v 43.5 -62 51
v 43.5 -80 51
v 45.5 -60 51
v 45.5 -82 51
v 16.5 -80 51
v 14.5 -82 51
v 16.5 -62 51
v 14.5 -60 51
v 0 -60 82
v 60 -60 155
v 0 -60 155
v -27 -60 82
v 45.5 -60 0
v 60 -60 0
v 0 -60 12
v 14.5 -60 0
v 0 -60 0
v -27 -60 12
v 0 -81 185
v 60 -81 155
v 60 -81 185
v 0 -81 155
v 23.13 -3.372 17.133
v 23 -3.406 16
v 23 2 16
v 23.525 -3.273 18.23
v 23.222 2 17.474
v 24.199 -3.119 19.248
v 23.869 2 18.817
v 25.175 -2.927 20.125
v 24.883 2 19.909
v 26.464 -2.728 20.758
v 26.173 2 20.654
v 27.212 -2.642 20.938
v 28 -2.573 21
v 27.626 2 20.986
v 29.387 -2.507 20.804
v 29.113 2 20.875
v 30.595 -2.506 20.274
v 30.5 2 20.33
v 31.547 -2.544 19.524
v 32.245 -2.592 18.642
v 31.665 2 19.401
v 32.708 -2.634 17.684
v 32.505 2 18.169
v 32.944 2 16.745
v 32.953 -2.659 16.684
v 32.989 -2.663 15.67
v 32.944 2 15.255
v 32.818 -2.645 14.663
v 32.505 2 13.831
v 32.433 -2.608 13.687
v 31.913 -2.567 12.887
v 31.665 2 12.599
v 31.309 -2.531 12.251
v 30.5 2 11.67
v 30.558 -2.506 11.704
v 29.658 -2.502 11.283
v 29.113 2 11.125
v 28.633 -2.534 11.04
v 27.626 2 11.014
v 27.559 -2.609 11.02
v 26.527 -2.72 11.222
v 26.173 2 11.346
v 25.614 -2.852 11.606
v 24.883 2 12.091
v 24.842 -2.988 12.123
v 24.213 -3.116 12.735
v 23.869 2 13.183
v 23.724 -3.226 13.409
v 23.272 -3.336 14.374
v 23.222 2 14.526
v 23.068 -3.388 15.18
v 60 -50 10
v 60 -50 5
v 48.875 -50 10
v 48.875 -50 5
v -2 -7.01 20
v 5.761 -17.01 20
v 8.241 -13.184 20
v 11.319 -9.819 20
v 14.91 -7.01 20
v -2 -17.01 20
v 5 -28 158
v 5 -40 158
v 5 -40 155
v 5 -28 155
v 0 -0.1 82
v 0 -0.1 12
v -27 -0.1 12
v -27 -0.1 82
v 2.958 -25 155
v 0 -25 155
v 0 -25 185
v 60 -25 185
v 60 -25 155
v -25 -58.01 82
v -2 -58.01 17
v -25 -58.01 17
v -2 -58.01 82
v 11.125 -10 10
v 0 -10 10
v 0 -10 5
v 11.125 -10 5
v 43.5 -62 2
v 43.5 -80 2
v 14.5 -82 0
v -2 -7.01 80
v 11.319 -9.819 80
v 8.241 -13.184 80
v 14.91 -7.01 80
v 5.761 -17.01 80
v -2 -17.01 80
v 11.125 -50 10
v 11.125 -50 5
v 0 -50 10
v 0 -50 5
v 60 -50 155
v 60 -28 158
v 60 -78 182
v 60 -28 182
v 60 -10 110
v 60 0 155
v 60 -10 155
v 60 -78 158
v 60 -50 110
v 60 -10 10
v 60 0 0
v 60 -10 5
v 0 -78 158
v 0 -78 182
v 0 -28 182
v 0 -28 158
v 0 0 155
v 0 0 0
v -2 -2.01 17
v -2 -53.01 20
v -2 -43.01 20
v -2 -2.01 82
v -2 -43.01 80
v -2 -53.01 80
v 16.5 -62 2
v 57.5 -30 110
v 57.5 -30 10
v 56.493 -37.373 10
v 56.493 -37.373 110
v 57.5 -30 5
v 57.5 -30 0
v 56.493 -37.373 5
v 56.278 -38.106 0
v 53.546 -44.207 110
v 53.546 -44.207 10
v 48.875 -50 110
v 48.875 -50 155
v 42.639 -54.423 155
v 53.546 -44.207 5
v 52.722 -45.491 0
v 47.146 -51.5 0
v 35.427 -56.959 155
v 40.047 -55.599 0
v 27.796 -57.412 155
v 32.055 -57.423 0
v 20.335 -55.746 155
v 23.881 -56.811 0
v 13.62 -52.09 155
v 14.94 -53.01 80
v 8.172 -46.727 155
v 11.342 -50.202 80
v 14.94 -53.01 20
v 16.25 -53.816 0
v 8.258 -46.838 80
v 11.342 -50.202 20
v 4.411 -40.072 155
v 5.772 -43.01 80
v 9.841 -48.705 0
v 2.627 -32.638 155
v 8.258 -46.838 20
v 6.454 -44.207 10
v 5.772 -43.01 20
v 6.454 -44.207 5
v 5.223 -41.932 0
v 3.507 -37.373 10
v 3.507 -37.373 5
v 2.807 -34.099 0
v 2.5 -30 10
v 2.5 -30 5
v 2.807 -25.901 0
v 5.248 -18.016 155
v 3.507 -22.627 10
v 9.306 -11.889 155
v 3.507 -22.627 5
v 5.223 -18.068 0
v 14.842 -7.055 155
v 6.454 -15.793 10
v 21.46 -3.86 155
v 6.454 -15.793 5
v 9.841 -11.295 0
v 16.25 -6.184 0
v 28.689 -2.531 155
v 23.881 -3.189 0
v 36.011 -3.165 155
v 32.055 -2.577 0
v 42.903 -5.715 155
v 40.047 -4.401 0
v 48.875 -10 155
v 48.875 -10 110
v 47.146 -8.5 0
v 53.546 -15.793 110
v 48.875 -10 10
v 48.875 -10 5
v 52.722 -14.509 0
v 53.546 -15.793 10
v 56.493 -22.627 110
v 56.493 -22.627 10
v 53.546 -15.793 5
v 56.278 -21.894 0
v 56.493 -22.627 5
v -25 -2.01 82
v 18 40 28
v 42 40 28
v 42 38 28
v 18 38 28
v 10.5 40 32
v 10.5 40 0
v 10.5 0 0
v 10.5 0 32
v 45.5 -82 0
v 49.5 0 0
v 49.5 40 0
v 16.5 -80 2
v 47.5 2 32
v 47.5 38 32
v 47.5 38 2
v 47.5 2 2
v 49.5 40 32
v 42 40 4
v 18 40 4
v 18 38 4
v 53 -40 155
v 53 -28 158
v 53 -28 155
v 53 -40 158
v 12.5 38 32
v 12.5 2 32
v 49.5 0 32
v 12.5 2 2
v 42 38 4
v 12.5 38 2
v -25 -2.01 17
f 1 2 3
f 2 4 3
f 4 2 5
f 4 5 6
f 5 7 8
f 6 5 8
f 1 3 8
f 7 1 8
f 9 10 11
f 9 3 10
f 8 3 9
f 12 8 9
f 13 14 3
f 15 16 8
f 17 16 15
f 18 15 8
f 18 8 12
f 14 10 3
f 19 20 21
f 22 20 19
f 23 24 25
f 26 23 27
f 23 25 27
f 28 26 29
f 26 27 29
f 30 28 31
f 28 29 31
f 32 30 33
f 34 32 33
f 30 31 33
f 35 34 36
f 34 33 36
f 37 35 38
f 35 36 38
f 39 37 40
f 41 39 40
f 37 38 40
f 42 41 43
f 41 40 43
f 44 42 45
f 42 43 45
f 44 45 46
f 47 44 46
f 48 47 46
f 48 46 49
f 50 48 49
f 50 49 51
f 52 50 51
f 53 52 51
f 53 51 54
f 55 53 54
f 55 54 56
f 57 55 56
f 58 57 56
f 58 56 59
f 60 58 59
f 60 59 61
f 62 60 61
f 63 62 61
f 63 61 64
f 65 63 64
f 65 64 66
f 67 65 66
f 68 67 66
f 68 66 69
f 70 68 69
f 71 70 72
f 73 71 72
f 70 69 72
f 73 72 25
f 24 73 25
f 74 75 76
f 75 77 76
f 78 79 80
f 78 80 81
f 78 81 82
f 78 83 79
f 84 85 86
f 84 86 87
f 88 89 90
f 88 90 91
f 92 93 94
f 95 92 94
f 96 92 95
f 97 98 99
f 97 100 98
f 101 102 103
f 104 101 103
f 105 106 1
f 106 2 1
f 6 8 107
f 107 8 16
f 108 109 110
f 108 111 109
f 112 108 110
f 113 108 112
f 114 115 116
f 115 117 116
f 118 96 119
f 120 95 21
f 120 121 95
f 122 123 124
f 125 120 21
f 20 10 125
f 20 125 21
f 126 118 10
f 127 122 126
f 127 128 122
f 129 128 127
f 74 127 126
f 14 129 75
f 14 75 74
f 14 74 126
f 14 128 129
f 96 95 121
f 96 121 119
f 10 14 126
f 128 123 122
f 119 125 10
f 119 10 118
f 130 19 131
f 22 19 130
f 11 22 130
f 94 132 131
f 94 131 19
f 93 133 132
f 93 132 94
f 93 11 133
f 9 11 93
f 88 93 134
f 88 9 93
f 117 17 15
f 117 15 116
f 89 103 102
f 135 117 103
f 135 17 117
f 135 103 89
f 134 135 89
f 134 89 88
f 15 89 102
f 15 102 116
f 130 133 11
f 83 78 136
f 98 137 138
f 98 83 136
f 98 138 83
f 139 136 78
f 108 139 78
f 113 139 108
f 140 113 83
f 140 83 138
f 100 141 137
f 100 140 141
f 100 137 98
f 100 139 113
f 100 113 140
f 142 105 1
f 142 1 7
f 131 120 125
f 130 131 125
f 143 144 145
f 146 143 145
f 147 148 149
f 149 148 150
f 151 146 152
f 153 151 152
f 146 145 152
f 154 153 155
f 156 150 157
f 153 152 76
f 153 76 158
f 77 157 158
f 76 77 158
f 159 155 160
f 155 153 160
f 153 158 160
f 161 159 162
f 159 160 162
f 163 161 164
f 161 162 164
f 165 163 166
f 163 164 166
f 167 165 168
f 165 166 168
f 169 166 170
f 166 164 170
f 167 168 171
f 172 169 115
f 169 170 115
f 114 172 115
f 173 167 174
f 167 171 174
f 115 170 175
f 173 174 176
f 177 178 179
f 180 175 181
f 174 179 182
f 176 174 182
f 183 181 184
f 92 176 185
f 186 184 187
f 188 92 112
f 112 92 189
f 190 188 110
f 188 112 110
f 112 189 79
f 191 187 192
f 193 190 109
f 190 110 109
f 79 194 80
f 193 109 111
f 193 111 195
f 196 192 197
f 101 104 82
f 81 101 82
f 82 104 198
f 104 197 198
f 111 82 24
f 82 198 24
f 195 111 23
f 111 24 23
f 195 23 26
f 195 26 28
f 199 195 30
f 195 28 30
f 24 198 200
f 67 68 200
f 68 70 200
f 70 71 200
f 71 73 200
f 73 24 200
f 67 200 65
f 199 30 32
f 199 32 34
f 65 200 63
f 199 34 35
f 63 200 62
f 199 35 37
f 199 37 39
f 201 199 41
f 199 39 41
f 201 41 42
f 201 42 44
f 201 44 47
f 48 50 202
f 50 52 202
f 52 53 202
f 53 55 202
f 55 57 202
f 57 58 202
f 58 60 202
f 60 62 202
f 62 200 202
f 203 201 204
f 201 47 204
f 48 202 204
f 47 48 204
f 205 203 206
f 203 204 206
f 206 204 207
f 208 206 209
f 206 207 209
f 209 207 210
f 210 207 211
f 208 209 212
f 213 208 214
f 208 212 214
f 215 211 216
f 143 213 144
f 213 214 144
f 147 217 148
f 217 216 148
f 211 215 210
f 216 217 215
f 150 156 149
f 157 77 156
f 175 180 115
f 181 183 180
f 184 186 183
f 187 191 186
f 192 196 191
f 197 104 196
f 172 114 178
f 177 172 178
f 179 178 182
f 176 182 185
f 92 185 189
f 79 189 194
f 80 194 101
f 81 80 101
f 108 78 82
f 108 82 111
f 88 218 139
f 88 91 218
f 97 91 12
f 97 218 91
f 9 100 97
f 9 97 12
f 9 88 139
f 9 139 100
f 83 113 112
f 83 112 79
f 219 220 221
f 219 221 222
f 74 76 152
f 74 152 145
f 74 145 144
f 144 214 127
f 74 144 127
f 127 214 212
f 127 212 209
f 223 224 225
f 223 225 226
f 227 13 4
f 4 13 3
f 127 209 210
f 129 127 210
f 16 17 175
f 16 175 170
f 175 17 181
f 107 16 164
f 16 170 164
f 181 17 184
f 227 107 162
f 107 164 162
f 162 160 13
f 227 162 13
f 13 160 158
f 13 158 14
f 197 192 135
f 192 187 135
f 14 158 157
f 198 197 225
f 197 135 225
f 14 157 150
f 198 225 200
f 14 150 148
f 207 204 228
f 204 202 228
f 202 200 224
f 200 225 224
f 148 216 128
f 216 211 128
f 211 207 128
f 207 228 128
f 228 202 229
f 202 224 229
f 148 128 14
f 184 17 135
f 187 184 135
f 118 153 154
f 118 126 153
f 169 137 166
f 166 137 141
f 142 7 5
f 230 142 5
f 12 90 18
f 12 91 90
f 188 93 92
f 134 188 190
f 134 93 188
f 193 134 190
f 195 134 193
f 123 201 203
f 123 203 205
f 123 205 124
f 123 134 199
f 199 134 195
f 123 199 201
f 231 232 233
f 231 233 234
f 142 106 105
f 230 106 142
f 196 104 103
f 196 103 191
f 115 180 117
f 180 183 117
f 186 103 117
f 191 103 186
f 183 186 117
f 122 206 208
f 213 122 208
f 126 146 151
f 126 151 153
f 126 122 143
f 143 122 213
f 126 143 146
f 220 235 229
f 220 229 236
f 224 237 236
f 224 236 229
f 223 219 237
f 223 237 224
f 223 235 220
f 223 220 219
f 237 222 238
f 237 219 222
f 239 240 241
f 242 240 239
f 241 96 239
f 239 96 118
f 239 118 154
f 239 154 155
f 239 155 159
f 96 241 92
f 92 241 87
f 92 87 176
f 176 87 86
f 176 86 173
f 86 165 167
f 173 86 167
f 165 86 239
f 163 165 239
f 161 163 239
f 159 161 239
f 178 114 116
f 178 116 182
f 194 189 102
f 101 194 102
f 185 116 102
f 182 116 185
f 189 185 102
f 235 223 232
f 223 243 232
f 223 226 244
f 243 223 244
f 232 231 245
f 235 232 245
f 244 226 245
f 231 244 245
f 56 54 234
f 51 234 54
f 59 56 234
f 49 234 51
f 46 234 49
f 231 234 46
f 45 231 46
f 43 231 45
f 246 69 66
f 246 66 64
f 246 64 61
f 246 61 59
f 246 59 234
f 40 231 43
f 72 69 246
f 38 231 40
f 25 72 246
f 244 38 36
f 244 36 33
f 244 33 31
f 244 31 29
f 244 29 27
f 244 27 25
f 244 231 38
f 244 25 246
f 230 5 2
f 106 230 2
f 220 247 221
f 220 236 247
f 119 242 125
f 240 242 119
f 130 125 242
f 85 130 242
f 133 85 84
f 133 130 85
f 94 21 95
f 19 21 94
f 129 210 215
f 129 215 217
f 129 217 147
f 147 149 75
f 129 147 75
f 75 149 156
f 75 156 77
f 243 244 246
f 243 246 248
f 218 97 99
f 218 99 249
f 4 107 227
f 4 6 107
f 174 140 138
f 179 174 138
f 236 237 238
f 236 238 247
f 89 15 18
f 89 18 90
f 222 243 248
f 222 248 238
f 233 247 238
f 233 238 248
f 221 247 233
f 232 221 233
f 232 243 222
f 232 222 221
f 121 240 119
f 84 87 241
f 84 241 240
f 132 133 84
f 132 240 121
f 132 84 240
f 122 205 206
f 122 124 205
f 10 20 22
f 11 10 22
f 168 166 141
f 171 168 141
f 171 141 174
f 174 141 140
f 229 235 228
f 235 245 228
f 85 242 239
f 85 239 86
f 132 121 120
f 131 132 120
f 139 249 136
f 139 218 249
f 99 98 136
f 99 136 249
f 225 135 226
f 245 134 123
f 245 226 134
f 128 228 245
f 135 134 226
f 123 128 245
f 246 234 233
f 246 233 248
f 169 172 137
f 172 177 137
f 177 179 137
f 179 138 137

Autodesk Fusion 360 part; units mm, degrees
sketch "Sketch1" plane through (0, 0, 0) normal (0, 0, 1) x (1, 0, 0)
  line L0 (0, 0) -> (60, 0)
  line L1 (60, 0) -> (60, -60)
  line L2 (60, -60) -> (0, -60)
  line L3 (0, -60) -> (0, 0)
  dimension "d1" = 60
  dimension "d2" = 60
extrude "Extrude1" add sketch "Sketch1" along normal blind 155
sketch "Sketch2" plane through (0, 0, 0) normal (0, 0, 1) x (1, 0, 0)
  line L0 (0, 0) -> (30, 0)
  line L1 (30, 0) -> (30, -30)
  circle A0 centre (30, -30) radius 27.5
  dimension "d5" = 30
  dimension "d6" = 30
  dimension "d7" = 55
extrude "Extrude2" cut sketch "Sketch2" along normal through all
sketch "Sketch3" plane through (0, 0, 0) normal (1, 0, 0) x (0, 1, 0)
  line L0 (0, 0) -> (0, 5)
  line L1 (0, 5) -> (-10, 5)
  line L2 (-10, 5) -> (-50, 5)
  line L3 (-50, 5) -> (-50, 10)
  line L4 (-50, 10) -> (-10, 10)
  line L5 (-10, 10) -> (-10, 5)
  dimension "d9" = 10
  dimension "d10" = 5
  dimension "d11" = 40
  dimension "d12" = 5
extrude "Extrude3" cut sketch "Sketch3" along normal through all
sketch "Sketch4" plane through (0, 0, 0) normal (-1, 0, 0) x (0, -1, 0)
  line L0 (50, 10) -> (50, 5)
  line L1 (50, 5) -> (10, 5)
  line L2 (10, 5) -> (10, 10)
  line L3 (10, 10) -> (50, 10)
  line L4 (0, 0) -> (60, 0)
  line L5 (60, 0) -> (60, 155)
  line L6 (60, 155) -> (0, 155)
  line L7 (0, 155) -> (0, 0)
  line L8 (0.1, 82) -> (60, 82)
  line L9 (60, 82) -> (60, 12)
  line L10 (60, 12) -> (0.1, 12)
  line L11 (0.1, 12) -> (0.1, 82)
  line L12 (0.1, 82) -> (0, 155)
  line L13 (0.1, 82) -> (0, 82)
  dimension "d15" = 59.9
  dimension "d16" = 70
  dimension "d98" = 73
  dimension "d99" = 0.1
extrude "Extrude4" add sketch "Sketch4" along normal blind 27 contours L5 L8 L9 L10 L11
sketch "Sketch5" plane through (0, 0, 155) normal (0, 0, 1) x (-1, 0, 0)
  circle A0 centre (-30, 30) radius 27.5
  line L0 (0, 60) -> (-60, 60)
  line L1 (-60, 60) -> (-60, 0)
  line L2 (-60, 0) -> (0, 0)
  line L3 (0, 0) -> (0, 60)
  line L4 (27, 0.01) -> (25, 0.01)
  line L5 (25, 0.01) -> (25, 2.01)
  line L6 (25, 2.01) -> (2, 2.01)
  line L7 (2, 2.01) -> (2, 58.01)
  line L8 (2, 58.01) -> (25, 58.01)
  line L9 (25, 58.01) -> (25, 2.01)
  dimension "d19" = 2
  dimension "d20" = 2
  dimension "d21" = 23
  dimension "d22" = 56
extrude "Extrude5" cut sketch "Sketch5" against normal blind 138 contours L6 L7 L8 L9
sketch "Sketch6" plane through (0, -60, 0) normal (0, -1, 0) x (1, 0, 0)
  line L0 (0, 0) -> (60, 0)
  line L1 (60, 0) -> (60, 155)
  line L2 (60, 155) -> (0, 155)
  line L3 (0, 155) -> (0, 82)
  line L4 (0, 82) -> (-27, 82)
  line L5 (-27, 82) -> (-27, 12)
  line L6 (-27, 12) -> (0, 12)
  line L7 (0, 12) -> (0, 0)
sketch "Sketch7" plane through (60, 0, 0) normal (1, 0, 0) x (0, 1, 0)
  line L0 (-50, 5) -> (-50, 10)
  line L1 (-50, 10) -> (-10, 10)
  line L2 (-10, 10) -> (-10, 5)
  line L3 (-10, 5) -> (-50, 5)
  line L4 (-60, 0) -> (0, 0)
  line L5 (0, 0) -> (0, 155)
  line L6 (0, 155) -> (-60, 155)
  line L7 (-60, 155) -> (-60, 0)
sketch "Sketch8" plane through (0, -60, 0) normal (0, -1, 0) x (1, 0, 0)
sketch "Sketch9" plane through (0, -60, 0) normal (0, -1, 0) x (1, 0, 0)
sketch "Sketch10" plane through (0, 0, 0) normal (0, 1, 0) x (-1, 0, 0)
  line L0 (-60, 0) -> (0, 0)
  line L1 (0, 0) -> (0, 155)
  line L2 (0, 155) -> (-60, 155)
  line L3 (-60, 155) -> (-60, 0)
  line L4 (-10.5, 32) -> (-49.5, 32)
  line L5 (-49.5, 32) -> (-49.5, 0)
  line L6 (-49.5, 0) -> (-10.5, 0)
  line L7 (-10.5, 0) -> (-10.5, 32)
  line L8 (-10.5, 32) -> (-10.5, 155)
  line L9 (-10.5, 155) -> (0, 155)
  dimension "d26" = 39
  dimension "d27" = 32
  dimension "d100" = 10.5
  dimension "d101" = 123
extrude "Extrude6" add sketch "Sketch10" along normal blind 40 contours L0 L4 L5 L6 L7
sketch "Sketch11" plane through (0, 0, 155) normal (0, 0, 1) x (-1, 0, 0)
  line L0 (27, 60) -> (0, 60)
  line L1 (0, 60) -> (0, 0.1)
  line L2 (2, 2.01) -> (2, 58.01)
  line L3 (2, 58.01) -> (25, 58.01)
  line L4 (25, 58.01) -> (25, 2.01)
  line L5 (25, 2.01) -> (2, 2.01)
  line L6 (0, 0.1) -> (27, 0.1)
  line L7 (27, 0.1) -> (27, 60)
sketch "Sketch12" plane through (0, 0, 155) normal (0, 0, 1) x (-1, 0, 0)
sketch "Sketch13" plane through (0, 0, 155) normal (0, 0, 1) x (-1, 0, 0)
sketch "Sketch15" plane through (0, 0, 155) normal (0, 0, 1) x (-1, 0, 0)
  line L0 (-49.5, 0) -> (-47.5, 0)
  line L1 (-47.5, 0) -> (-47.5, -2)
  line L2 (-60, 0) -> (-49.5, 0)
  line L3 (-49.5, 0) -> (-49.5, -40)
  line L4 (-47.5, -2) -> (-12.5, -2)
  line L5 (-12.5, -2) -> (-12.5, -38)
  line L6 (-12.5, -38) -> (-47.5, -38)
  line L7 (-47.5, -38) -> (-47.5, -2)
  dimension "d34" = 2
  dimension "d35" = 2
  dimension "d36" = 35
  dimension "d37" = 36
extrude "Extrude7" cut sketch "Sketch15" against normal blind 153
sketch "Sketch16" plane through (0, 40, 0) normal (0, 1, 0) x (-1, 0, 0)
  line L0 (-10.5, 0) -> (-10.5, 32)
  line L1 (-10.5, 32) -> (-49.5, 32)
  line L2 (-49.5, 32) -> (-49.5, 0)
  line L3 (-49.5, 0) -> (-10.5, 0)
  line L4 (-49.5, 32) -> (-42, 32)
  line L5 (-42, 32) -> (-42, 28)
  line L6 (-42, 28) -> (-18, 28)
  line L7 (-18, 28) -> (-18, 4)
  line L8 (-18, 4) -> (-42, 4)
  line L9 (-42, 4) -> (-42, 28)
  dimension "d40" = 7.5
  dimension "d41" = 4
  dimension "d42" = 24
  dimension "d43" = 24
extrude "Extrude8" cut sketch "Sketch16" against normal blind 15 contours L6 L7 L8 L9
sketch "Sketch17" plane through (0, 2, 0) normal (0, 1, 0) x (-1, 0, 0)
  line L0 (-12.5, 32) -> (-47.5, 32)
  line L1 (-47.5, 32) -> (-47.5, 2)
  line L2 (-47.5, 2) -> (-12.5, 2)
  line L3 (-12.5, 2) -> (-12.5, 32)
  line L4 (-47.5, 32) -> (-28, 32)
  line L5 (-28, 32) -> (-28, 16)
  circle A0 centre (-28, 16) radius 5
  dimension "d46" = 19.5
  dimension "d47" = 16
  dimension "d48" = 10
extrude "Extrude9" cut sketch "Sketch17" against normal blind 12 contours A0
sketch "Sketch18" plane through (0, -60, 0) normal (0, -1, 0) x (1, 0, 0)
sketch "Sketch19" plane through (0, -60, 0) normal (0, -1, 0) x (1, 0, 0)
sketch "Sketch20" plane through (0, -60, 0) normal (0, -1, 0) x (1, 0, 0)
  line L0 (45.5, 51) -> (14.5, 51)
  line L1 (14.5, 51) -> (14.5, 0)
  line L2 (14.5, 0) -> (45.5, 0)
  line L3 (45.5, 0) -> (45.5, 51)
  line L4 (60, 0) -> (60, 155)
  line L5 (45.5, 51) -> (60, 51)
  line L6 (60, 51) -> (60, 155)
  dimension "d52" = 31
  dimension "d53" = 51
  dimension "d96" = 104
  dimension "d97" = 14.5
extrude "Extrude10" add sketch "Sketch20" along normal blind 22
sketch "Sketch21" plane through (0, 0, 155) normal (0, 0, 1) x (-1, 0, 0)
  line L0 (27, 60) -> (0, 60)
  line L1 (0, 60) -> (0, 0.1)
  line L2 (-14.5, 82) -> (-14.5, 80)
  line L3 (-14.5, 80) -> (-16.5, 80)
  line L4 (2, 2.01) -> (2, 58.01)
  line L5 (2, 58.01) -> (25, 58.01)
  line L6 (25, 58.01) -> (25, 2.01)
  line L7 (25, 2.01) -> (2, 2.01)
  line L8 (0, 0.1) -> (27, 0.1)
  line L9 (27, 0.1) -> (27, 60)
  line L10 (-12.5, -2) -> (-12.5, -38)
  line L11 (-12.5, -38) -> (-47.5, -38)
  line L12 (-47.5, -38) -> (-47.5, -2)
  line L13 (-47.5, -2) -> (-12.5, -2)
  line L14 (-10.5, 0) -> (-49.5, 0)
  line L15 (-49.5, 0) -> (-49.5, -40)
  line L16 (-49.5, -40) -> (-10.5, -40)
  line L17 (-10.5, -40) -> (-10.5, 0)
  dimension "d56" = 2
  dimension "d57" = 2
sketch "Sketch22" plane through (0, 0, 155) normal (0, 0, 1) x (-1, 0, 0)
  line L0 (-16.5, 80) -> (-43.5, 80)
  line L1 (-43.5, 80) -> (-43.5, 62)
  line L2 (-43.5, 62) -> (-16.5, 62)
  line L3 (-16.5, 62) -> (-16.5, 80)
  dimension "d58" = 27
  dimension "d59" = 18
extrude "Extrude11" cut sketch "Sketch22" against normal blind 153
sketch "Sketch24" plane through (0, 0, 155) normal (0, 0, 1) x (1, 0, 0)
sketch "Sketch26" plane through (-2, 0, 0) normal (-1, 0, 0) x (0, -1, 0)
  line L0 (58.01, 82) -> (2.01, 82)
  line L1 (2.01, 82) -> (2.01, 17)
  line L2 (2.01, 17) -> (58.01, 17)
  line L3 (58.01, 17) -> (58.01, 82)
  line L4 (2.01, 155) -> (2.01, 80)
  line L5 (2.01, 80) -> (7.01, 80)
  line L6 (7.01, 80) -> (17.01, 80)
  line L7 (17.01, 80) -> (17.01, 20)
  line L8 (17.01, 20) -> (7.01, 20)
  line L9 (7.01, 20) -> (7.01, 80)
  line L10 (30.01, 155) -> (30.01, 17)
  line L11 (2.01, 155) -> (58.01, 155)
  line L12 (43.01, 80) -> (43.01, 20)
  line L13 (53.01, 80) -> (43.01, 80)
  line L14 (53.01, 20) -> (53.01, 80)
  line L15 (43.01, 20) -> (53.01, 20)
  dimension "d66" = 75
  dimension "d67" = 5
  dimension "d68" = 10
  dimension "d69" = 60
extrude "Extrude14" cut sketch "Sketch26" against normal blind 25 contours L12 L13 L14 L15
extrude "Extrude13" cut sketch "Sketch26" against normal blind 25 contours L6 L7 L8 L9
sketch "Sketch27" plane through (60, 0, 0) normal (1, 0, 0) x (0, 1, 0)
  line L0 (-60, 155) -> (-50, 155)
  line L1 (-50, 155) -> (-10, 155)
  line L2 (-10, 155) -> (-10, 110)
  line L3 (-10, 110) -> (-50, 110)
  line L4 (-50, 110) -> (-50, 155)
  dimension "d74" = 10
  dimension "d75" = 40
  dimension "d76" = 45
extrude "Extrude15" cut sketch "Sketch27" against normal blind 20
sketch "Sketch28" plane through (0, 0, 155) normal (0, 0, 1) x (-1, 0, 0)
  line L0 (-60, 30) -> (0, 30) construction
  line L1 (-60, 60) -> (-60, 0)
  line L2 (0, 30) -> (0, 25)
  line L3 (0, 25) -> (-60, 25)
  line L4 (-60, 25) -> (-60, 81)
  line L5 (-60, 81) -> (0, 81)
  line L6 (0, 81) -> (0, 25)
  dimension "d79" = 5
  dimension "d80" = 60
  dimension "d81" = 56
extrude "Extrude16" add sketch "Sketch28" along normal blind 30
sketch "Sketch29" plane through (0, 0, 155) normal (0, 0, 1) x (-1, 0, 0)
sketch "Sketch30" plane through (0, 0, 0) normal (-1, 0, 0) x (0, -1, 0)
  line L0 (60, 82) -> (60, 155)
  line L1 (60, 12) -> (0.1, 12)
  line L2 (0.1, 12) -> (0.1, 82)
  line L3 (0.1, 82) -> (60, 82)
  line L4 (0, 155) -> (0, 0)
  line L5 (0, 0) -> (60, 0)
  line L6 (60, 155) -> (81, 155)
  line L7 (81, 155) -> (81, 185)
  line L8 (81, 185) -> (25, 185)
  line L9 (25, 185) -> (25, 155)
  line L10 (50, 10) -> (50, 5)
  line L11 (50, 5) -> (10, 5)
  line L12 (10, 5) -> (10, 10)
  line L13 (10, 10) -> (50, 10)
  line L14 (25, 185) -> (28, 185)
  line L15 (28, 185) -> (28, 182)
  line L16 (28, 182) -> (78, 182)
  line L17 (78, 182) -> (78, 158)
  line L18 (78, 158) -> (28, 158)
  line L19 (28, 158) -> (28, 182)
  line L20 (25, 155) -> (0, 155)
  line L21 (60, 0) -> (60, 12)
  dimension "d84" = 3
  dimension "d85" = 3
  dimension "d86" = 50
  dimension "d87" = 24
extrude "Extrude17" cut sketch "Sketch30" against normal through all contours L16 L17 L18 L19
sketch "Sketch31" plane through (60, 0, 0) normal (1, 0, 0) x (0, 1, 0)
sketch "Sketch32" plane through (0, 0, 185) normal (0, 0, 1) x (-1, 0, 0)
  line L0 (0, 81) -> (-60, 81)
  line L1 (-60, 81) -> (-60, 25)
  line L2 (-60, 25) -> (0, 25)
  line L3 (0, 25) -> (0, 81)
  line L4 (0, 25) -> (-60, 25)
  line L5 (-60, 25) -> (-60, 48)
  line L6 (-60, 48) -> (0, 48)
  line L7 (0, 48) -> (0, 25)
  dimension "d89" = 60
  dimension "d90" = 23
sketch "Sketch33" plane through (0, 0, 158) normal (0, 0, 1) x (-1, 0, 0)
  line L0 (-60, 78) -> (-60, 28)
  line L1 (-60, 28) -> (0, 28)
  line L2 (0, 28) -> (0, 78)
  line L3 (0, 78) -> (-60, 78)
  line L4 (0, 28) -> (-5, 28)
  line L5 (-5, 28) -> (-53, 28)
  line L6 (-53, 28) -> (-53, 40)
  line L7 (-53, 40) -> (-5, 40)
  line L8 (-5, 40) -> (-5, 28)
  dimension "d93" = 48
  dimension "d94" = 12
extrude "Extrude19" cut sketch "Sketch33" against normal through all contours L1 L5 L6 L7 L8
equation "d23 = -65.00 mm - 73 mm"
equation "d38 = -30.00 mm - 123 mm"
equation "d60 = -49.00 mm - 50 mm - 54 mm"
